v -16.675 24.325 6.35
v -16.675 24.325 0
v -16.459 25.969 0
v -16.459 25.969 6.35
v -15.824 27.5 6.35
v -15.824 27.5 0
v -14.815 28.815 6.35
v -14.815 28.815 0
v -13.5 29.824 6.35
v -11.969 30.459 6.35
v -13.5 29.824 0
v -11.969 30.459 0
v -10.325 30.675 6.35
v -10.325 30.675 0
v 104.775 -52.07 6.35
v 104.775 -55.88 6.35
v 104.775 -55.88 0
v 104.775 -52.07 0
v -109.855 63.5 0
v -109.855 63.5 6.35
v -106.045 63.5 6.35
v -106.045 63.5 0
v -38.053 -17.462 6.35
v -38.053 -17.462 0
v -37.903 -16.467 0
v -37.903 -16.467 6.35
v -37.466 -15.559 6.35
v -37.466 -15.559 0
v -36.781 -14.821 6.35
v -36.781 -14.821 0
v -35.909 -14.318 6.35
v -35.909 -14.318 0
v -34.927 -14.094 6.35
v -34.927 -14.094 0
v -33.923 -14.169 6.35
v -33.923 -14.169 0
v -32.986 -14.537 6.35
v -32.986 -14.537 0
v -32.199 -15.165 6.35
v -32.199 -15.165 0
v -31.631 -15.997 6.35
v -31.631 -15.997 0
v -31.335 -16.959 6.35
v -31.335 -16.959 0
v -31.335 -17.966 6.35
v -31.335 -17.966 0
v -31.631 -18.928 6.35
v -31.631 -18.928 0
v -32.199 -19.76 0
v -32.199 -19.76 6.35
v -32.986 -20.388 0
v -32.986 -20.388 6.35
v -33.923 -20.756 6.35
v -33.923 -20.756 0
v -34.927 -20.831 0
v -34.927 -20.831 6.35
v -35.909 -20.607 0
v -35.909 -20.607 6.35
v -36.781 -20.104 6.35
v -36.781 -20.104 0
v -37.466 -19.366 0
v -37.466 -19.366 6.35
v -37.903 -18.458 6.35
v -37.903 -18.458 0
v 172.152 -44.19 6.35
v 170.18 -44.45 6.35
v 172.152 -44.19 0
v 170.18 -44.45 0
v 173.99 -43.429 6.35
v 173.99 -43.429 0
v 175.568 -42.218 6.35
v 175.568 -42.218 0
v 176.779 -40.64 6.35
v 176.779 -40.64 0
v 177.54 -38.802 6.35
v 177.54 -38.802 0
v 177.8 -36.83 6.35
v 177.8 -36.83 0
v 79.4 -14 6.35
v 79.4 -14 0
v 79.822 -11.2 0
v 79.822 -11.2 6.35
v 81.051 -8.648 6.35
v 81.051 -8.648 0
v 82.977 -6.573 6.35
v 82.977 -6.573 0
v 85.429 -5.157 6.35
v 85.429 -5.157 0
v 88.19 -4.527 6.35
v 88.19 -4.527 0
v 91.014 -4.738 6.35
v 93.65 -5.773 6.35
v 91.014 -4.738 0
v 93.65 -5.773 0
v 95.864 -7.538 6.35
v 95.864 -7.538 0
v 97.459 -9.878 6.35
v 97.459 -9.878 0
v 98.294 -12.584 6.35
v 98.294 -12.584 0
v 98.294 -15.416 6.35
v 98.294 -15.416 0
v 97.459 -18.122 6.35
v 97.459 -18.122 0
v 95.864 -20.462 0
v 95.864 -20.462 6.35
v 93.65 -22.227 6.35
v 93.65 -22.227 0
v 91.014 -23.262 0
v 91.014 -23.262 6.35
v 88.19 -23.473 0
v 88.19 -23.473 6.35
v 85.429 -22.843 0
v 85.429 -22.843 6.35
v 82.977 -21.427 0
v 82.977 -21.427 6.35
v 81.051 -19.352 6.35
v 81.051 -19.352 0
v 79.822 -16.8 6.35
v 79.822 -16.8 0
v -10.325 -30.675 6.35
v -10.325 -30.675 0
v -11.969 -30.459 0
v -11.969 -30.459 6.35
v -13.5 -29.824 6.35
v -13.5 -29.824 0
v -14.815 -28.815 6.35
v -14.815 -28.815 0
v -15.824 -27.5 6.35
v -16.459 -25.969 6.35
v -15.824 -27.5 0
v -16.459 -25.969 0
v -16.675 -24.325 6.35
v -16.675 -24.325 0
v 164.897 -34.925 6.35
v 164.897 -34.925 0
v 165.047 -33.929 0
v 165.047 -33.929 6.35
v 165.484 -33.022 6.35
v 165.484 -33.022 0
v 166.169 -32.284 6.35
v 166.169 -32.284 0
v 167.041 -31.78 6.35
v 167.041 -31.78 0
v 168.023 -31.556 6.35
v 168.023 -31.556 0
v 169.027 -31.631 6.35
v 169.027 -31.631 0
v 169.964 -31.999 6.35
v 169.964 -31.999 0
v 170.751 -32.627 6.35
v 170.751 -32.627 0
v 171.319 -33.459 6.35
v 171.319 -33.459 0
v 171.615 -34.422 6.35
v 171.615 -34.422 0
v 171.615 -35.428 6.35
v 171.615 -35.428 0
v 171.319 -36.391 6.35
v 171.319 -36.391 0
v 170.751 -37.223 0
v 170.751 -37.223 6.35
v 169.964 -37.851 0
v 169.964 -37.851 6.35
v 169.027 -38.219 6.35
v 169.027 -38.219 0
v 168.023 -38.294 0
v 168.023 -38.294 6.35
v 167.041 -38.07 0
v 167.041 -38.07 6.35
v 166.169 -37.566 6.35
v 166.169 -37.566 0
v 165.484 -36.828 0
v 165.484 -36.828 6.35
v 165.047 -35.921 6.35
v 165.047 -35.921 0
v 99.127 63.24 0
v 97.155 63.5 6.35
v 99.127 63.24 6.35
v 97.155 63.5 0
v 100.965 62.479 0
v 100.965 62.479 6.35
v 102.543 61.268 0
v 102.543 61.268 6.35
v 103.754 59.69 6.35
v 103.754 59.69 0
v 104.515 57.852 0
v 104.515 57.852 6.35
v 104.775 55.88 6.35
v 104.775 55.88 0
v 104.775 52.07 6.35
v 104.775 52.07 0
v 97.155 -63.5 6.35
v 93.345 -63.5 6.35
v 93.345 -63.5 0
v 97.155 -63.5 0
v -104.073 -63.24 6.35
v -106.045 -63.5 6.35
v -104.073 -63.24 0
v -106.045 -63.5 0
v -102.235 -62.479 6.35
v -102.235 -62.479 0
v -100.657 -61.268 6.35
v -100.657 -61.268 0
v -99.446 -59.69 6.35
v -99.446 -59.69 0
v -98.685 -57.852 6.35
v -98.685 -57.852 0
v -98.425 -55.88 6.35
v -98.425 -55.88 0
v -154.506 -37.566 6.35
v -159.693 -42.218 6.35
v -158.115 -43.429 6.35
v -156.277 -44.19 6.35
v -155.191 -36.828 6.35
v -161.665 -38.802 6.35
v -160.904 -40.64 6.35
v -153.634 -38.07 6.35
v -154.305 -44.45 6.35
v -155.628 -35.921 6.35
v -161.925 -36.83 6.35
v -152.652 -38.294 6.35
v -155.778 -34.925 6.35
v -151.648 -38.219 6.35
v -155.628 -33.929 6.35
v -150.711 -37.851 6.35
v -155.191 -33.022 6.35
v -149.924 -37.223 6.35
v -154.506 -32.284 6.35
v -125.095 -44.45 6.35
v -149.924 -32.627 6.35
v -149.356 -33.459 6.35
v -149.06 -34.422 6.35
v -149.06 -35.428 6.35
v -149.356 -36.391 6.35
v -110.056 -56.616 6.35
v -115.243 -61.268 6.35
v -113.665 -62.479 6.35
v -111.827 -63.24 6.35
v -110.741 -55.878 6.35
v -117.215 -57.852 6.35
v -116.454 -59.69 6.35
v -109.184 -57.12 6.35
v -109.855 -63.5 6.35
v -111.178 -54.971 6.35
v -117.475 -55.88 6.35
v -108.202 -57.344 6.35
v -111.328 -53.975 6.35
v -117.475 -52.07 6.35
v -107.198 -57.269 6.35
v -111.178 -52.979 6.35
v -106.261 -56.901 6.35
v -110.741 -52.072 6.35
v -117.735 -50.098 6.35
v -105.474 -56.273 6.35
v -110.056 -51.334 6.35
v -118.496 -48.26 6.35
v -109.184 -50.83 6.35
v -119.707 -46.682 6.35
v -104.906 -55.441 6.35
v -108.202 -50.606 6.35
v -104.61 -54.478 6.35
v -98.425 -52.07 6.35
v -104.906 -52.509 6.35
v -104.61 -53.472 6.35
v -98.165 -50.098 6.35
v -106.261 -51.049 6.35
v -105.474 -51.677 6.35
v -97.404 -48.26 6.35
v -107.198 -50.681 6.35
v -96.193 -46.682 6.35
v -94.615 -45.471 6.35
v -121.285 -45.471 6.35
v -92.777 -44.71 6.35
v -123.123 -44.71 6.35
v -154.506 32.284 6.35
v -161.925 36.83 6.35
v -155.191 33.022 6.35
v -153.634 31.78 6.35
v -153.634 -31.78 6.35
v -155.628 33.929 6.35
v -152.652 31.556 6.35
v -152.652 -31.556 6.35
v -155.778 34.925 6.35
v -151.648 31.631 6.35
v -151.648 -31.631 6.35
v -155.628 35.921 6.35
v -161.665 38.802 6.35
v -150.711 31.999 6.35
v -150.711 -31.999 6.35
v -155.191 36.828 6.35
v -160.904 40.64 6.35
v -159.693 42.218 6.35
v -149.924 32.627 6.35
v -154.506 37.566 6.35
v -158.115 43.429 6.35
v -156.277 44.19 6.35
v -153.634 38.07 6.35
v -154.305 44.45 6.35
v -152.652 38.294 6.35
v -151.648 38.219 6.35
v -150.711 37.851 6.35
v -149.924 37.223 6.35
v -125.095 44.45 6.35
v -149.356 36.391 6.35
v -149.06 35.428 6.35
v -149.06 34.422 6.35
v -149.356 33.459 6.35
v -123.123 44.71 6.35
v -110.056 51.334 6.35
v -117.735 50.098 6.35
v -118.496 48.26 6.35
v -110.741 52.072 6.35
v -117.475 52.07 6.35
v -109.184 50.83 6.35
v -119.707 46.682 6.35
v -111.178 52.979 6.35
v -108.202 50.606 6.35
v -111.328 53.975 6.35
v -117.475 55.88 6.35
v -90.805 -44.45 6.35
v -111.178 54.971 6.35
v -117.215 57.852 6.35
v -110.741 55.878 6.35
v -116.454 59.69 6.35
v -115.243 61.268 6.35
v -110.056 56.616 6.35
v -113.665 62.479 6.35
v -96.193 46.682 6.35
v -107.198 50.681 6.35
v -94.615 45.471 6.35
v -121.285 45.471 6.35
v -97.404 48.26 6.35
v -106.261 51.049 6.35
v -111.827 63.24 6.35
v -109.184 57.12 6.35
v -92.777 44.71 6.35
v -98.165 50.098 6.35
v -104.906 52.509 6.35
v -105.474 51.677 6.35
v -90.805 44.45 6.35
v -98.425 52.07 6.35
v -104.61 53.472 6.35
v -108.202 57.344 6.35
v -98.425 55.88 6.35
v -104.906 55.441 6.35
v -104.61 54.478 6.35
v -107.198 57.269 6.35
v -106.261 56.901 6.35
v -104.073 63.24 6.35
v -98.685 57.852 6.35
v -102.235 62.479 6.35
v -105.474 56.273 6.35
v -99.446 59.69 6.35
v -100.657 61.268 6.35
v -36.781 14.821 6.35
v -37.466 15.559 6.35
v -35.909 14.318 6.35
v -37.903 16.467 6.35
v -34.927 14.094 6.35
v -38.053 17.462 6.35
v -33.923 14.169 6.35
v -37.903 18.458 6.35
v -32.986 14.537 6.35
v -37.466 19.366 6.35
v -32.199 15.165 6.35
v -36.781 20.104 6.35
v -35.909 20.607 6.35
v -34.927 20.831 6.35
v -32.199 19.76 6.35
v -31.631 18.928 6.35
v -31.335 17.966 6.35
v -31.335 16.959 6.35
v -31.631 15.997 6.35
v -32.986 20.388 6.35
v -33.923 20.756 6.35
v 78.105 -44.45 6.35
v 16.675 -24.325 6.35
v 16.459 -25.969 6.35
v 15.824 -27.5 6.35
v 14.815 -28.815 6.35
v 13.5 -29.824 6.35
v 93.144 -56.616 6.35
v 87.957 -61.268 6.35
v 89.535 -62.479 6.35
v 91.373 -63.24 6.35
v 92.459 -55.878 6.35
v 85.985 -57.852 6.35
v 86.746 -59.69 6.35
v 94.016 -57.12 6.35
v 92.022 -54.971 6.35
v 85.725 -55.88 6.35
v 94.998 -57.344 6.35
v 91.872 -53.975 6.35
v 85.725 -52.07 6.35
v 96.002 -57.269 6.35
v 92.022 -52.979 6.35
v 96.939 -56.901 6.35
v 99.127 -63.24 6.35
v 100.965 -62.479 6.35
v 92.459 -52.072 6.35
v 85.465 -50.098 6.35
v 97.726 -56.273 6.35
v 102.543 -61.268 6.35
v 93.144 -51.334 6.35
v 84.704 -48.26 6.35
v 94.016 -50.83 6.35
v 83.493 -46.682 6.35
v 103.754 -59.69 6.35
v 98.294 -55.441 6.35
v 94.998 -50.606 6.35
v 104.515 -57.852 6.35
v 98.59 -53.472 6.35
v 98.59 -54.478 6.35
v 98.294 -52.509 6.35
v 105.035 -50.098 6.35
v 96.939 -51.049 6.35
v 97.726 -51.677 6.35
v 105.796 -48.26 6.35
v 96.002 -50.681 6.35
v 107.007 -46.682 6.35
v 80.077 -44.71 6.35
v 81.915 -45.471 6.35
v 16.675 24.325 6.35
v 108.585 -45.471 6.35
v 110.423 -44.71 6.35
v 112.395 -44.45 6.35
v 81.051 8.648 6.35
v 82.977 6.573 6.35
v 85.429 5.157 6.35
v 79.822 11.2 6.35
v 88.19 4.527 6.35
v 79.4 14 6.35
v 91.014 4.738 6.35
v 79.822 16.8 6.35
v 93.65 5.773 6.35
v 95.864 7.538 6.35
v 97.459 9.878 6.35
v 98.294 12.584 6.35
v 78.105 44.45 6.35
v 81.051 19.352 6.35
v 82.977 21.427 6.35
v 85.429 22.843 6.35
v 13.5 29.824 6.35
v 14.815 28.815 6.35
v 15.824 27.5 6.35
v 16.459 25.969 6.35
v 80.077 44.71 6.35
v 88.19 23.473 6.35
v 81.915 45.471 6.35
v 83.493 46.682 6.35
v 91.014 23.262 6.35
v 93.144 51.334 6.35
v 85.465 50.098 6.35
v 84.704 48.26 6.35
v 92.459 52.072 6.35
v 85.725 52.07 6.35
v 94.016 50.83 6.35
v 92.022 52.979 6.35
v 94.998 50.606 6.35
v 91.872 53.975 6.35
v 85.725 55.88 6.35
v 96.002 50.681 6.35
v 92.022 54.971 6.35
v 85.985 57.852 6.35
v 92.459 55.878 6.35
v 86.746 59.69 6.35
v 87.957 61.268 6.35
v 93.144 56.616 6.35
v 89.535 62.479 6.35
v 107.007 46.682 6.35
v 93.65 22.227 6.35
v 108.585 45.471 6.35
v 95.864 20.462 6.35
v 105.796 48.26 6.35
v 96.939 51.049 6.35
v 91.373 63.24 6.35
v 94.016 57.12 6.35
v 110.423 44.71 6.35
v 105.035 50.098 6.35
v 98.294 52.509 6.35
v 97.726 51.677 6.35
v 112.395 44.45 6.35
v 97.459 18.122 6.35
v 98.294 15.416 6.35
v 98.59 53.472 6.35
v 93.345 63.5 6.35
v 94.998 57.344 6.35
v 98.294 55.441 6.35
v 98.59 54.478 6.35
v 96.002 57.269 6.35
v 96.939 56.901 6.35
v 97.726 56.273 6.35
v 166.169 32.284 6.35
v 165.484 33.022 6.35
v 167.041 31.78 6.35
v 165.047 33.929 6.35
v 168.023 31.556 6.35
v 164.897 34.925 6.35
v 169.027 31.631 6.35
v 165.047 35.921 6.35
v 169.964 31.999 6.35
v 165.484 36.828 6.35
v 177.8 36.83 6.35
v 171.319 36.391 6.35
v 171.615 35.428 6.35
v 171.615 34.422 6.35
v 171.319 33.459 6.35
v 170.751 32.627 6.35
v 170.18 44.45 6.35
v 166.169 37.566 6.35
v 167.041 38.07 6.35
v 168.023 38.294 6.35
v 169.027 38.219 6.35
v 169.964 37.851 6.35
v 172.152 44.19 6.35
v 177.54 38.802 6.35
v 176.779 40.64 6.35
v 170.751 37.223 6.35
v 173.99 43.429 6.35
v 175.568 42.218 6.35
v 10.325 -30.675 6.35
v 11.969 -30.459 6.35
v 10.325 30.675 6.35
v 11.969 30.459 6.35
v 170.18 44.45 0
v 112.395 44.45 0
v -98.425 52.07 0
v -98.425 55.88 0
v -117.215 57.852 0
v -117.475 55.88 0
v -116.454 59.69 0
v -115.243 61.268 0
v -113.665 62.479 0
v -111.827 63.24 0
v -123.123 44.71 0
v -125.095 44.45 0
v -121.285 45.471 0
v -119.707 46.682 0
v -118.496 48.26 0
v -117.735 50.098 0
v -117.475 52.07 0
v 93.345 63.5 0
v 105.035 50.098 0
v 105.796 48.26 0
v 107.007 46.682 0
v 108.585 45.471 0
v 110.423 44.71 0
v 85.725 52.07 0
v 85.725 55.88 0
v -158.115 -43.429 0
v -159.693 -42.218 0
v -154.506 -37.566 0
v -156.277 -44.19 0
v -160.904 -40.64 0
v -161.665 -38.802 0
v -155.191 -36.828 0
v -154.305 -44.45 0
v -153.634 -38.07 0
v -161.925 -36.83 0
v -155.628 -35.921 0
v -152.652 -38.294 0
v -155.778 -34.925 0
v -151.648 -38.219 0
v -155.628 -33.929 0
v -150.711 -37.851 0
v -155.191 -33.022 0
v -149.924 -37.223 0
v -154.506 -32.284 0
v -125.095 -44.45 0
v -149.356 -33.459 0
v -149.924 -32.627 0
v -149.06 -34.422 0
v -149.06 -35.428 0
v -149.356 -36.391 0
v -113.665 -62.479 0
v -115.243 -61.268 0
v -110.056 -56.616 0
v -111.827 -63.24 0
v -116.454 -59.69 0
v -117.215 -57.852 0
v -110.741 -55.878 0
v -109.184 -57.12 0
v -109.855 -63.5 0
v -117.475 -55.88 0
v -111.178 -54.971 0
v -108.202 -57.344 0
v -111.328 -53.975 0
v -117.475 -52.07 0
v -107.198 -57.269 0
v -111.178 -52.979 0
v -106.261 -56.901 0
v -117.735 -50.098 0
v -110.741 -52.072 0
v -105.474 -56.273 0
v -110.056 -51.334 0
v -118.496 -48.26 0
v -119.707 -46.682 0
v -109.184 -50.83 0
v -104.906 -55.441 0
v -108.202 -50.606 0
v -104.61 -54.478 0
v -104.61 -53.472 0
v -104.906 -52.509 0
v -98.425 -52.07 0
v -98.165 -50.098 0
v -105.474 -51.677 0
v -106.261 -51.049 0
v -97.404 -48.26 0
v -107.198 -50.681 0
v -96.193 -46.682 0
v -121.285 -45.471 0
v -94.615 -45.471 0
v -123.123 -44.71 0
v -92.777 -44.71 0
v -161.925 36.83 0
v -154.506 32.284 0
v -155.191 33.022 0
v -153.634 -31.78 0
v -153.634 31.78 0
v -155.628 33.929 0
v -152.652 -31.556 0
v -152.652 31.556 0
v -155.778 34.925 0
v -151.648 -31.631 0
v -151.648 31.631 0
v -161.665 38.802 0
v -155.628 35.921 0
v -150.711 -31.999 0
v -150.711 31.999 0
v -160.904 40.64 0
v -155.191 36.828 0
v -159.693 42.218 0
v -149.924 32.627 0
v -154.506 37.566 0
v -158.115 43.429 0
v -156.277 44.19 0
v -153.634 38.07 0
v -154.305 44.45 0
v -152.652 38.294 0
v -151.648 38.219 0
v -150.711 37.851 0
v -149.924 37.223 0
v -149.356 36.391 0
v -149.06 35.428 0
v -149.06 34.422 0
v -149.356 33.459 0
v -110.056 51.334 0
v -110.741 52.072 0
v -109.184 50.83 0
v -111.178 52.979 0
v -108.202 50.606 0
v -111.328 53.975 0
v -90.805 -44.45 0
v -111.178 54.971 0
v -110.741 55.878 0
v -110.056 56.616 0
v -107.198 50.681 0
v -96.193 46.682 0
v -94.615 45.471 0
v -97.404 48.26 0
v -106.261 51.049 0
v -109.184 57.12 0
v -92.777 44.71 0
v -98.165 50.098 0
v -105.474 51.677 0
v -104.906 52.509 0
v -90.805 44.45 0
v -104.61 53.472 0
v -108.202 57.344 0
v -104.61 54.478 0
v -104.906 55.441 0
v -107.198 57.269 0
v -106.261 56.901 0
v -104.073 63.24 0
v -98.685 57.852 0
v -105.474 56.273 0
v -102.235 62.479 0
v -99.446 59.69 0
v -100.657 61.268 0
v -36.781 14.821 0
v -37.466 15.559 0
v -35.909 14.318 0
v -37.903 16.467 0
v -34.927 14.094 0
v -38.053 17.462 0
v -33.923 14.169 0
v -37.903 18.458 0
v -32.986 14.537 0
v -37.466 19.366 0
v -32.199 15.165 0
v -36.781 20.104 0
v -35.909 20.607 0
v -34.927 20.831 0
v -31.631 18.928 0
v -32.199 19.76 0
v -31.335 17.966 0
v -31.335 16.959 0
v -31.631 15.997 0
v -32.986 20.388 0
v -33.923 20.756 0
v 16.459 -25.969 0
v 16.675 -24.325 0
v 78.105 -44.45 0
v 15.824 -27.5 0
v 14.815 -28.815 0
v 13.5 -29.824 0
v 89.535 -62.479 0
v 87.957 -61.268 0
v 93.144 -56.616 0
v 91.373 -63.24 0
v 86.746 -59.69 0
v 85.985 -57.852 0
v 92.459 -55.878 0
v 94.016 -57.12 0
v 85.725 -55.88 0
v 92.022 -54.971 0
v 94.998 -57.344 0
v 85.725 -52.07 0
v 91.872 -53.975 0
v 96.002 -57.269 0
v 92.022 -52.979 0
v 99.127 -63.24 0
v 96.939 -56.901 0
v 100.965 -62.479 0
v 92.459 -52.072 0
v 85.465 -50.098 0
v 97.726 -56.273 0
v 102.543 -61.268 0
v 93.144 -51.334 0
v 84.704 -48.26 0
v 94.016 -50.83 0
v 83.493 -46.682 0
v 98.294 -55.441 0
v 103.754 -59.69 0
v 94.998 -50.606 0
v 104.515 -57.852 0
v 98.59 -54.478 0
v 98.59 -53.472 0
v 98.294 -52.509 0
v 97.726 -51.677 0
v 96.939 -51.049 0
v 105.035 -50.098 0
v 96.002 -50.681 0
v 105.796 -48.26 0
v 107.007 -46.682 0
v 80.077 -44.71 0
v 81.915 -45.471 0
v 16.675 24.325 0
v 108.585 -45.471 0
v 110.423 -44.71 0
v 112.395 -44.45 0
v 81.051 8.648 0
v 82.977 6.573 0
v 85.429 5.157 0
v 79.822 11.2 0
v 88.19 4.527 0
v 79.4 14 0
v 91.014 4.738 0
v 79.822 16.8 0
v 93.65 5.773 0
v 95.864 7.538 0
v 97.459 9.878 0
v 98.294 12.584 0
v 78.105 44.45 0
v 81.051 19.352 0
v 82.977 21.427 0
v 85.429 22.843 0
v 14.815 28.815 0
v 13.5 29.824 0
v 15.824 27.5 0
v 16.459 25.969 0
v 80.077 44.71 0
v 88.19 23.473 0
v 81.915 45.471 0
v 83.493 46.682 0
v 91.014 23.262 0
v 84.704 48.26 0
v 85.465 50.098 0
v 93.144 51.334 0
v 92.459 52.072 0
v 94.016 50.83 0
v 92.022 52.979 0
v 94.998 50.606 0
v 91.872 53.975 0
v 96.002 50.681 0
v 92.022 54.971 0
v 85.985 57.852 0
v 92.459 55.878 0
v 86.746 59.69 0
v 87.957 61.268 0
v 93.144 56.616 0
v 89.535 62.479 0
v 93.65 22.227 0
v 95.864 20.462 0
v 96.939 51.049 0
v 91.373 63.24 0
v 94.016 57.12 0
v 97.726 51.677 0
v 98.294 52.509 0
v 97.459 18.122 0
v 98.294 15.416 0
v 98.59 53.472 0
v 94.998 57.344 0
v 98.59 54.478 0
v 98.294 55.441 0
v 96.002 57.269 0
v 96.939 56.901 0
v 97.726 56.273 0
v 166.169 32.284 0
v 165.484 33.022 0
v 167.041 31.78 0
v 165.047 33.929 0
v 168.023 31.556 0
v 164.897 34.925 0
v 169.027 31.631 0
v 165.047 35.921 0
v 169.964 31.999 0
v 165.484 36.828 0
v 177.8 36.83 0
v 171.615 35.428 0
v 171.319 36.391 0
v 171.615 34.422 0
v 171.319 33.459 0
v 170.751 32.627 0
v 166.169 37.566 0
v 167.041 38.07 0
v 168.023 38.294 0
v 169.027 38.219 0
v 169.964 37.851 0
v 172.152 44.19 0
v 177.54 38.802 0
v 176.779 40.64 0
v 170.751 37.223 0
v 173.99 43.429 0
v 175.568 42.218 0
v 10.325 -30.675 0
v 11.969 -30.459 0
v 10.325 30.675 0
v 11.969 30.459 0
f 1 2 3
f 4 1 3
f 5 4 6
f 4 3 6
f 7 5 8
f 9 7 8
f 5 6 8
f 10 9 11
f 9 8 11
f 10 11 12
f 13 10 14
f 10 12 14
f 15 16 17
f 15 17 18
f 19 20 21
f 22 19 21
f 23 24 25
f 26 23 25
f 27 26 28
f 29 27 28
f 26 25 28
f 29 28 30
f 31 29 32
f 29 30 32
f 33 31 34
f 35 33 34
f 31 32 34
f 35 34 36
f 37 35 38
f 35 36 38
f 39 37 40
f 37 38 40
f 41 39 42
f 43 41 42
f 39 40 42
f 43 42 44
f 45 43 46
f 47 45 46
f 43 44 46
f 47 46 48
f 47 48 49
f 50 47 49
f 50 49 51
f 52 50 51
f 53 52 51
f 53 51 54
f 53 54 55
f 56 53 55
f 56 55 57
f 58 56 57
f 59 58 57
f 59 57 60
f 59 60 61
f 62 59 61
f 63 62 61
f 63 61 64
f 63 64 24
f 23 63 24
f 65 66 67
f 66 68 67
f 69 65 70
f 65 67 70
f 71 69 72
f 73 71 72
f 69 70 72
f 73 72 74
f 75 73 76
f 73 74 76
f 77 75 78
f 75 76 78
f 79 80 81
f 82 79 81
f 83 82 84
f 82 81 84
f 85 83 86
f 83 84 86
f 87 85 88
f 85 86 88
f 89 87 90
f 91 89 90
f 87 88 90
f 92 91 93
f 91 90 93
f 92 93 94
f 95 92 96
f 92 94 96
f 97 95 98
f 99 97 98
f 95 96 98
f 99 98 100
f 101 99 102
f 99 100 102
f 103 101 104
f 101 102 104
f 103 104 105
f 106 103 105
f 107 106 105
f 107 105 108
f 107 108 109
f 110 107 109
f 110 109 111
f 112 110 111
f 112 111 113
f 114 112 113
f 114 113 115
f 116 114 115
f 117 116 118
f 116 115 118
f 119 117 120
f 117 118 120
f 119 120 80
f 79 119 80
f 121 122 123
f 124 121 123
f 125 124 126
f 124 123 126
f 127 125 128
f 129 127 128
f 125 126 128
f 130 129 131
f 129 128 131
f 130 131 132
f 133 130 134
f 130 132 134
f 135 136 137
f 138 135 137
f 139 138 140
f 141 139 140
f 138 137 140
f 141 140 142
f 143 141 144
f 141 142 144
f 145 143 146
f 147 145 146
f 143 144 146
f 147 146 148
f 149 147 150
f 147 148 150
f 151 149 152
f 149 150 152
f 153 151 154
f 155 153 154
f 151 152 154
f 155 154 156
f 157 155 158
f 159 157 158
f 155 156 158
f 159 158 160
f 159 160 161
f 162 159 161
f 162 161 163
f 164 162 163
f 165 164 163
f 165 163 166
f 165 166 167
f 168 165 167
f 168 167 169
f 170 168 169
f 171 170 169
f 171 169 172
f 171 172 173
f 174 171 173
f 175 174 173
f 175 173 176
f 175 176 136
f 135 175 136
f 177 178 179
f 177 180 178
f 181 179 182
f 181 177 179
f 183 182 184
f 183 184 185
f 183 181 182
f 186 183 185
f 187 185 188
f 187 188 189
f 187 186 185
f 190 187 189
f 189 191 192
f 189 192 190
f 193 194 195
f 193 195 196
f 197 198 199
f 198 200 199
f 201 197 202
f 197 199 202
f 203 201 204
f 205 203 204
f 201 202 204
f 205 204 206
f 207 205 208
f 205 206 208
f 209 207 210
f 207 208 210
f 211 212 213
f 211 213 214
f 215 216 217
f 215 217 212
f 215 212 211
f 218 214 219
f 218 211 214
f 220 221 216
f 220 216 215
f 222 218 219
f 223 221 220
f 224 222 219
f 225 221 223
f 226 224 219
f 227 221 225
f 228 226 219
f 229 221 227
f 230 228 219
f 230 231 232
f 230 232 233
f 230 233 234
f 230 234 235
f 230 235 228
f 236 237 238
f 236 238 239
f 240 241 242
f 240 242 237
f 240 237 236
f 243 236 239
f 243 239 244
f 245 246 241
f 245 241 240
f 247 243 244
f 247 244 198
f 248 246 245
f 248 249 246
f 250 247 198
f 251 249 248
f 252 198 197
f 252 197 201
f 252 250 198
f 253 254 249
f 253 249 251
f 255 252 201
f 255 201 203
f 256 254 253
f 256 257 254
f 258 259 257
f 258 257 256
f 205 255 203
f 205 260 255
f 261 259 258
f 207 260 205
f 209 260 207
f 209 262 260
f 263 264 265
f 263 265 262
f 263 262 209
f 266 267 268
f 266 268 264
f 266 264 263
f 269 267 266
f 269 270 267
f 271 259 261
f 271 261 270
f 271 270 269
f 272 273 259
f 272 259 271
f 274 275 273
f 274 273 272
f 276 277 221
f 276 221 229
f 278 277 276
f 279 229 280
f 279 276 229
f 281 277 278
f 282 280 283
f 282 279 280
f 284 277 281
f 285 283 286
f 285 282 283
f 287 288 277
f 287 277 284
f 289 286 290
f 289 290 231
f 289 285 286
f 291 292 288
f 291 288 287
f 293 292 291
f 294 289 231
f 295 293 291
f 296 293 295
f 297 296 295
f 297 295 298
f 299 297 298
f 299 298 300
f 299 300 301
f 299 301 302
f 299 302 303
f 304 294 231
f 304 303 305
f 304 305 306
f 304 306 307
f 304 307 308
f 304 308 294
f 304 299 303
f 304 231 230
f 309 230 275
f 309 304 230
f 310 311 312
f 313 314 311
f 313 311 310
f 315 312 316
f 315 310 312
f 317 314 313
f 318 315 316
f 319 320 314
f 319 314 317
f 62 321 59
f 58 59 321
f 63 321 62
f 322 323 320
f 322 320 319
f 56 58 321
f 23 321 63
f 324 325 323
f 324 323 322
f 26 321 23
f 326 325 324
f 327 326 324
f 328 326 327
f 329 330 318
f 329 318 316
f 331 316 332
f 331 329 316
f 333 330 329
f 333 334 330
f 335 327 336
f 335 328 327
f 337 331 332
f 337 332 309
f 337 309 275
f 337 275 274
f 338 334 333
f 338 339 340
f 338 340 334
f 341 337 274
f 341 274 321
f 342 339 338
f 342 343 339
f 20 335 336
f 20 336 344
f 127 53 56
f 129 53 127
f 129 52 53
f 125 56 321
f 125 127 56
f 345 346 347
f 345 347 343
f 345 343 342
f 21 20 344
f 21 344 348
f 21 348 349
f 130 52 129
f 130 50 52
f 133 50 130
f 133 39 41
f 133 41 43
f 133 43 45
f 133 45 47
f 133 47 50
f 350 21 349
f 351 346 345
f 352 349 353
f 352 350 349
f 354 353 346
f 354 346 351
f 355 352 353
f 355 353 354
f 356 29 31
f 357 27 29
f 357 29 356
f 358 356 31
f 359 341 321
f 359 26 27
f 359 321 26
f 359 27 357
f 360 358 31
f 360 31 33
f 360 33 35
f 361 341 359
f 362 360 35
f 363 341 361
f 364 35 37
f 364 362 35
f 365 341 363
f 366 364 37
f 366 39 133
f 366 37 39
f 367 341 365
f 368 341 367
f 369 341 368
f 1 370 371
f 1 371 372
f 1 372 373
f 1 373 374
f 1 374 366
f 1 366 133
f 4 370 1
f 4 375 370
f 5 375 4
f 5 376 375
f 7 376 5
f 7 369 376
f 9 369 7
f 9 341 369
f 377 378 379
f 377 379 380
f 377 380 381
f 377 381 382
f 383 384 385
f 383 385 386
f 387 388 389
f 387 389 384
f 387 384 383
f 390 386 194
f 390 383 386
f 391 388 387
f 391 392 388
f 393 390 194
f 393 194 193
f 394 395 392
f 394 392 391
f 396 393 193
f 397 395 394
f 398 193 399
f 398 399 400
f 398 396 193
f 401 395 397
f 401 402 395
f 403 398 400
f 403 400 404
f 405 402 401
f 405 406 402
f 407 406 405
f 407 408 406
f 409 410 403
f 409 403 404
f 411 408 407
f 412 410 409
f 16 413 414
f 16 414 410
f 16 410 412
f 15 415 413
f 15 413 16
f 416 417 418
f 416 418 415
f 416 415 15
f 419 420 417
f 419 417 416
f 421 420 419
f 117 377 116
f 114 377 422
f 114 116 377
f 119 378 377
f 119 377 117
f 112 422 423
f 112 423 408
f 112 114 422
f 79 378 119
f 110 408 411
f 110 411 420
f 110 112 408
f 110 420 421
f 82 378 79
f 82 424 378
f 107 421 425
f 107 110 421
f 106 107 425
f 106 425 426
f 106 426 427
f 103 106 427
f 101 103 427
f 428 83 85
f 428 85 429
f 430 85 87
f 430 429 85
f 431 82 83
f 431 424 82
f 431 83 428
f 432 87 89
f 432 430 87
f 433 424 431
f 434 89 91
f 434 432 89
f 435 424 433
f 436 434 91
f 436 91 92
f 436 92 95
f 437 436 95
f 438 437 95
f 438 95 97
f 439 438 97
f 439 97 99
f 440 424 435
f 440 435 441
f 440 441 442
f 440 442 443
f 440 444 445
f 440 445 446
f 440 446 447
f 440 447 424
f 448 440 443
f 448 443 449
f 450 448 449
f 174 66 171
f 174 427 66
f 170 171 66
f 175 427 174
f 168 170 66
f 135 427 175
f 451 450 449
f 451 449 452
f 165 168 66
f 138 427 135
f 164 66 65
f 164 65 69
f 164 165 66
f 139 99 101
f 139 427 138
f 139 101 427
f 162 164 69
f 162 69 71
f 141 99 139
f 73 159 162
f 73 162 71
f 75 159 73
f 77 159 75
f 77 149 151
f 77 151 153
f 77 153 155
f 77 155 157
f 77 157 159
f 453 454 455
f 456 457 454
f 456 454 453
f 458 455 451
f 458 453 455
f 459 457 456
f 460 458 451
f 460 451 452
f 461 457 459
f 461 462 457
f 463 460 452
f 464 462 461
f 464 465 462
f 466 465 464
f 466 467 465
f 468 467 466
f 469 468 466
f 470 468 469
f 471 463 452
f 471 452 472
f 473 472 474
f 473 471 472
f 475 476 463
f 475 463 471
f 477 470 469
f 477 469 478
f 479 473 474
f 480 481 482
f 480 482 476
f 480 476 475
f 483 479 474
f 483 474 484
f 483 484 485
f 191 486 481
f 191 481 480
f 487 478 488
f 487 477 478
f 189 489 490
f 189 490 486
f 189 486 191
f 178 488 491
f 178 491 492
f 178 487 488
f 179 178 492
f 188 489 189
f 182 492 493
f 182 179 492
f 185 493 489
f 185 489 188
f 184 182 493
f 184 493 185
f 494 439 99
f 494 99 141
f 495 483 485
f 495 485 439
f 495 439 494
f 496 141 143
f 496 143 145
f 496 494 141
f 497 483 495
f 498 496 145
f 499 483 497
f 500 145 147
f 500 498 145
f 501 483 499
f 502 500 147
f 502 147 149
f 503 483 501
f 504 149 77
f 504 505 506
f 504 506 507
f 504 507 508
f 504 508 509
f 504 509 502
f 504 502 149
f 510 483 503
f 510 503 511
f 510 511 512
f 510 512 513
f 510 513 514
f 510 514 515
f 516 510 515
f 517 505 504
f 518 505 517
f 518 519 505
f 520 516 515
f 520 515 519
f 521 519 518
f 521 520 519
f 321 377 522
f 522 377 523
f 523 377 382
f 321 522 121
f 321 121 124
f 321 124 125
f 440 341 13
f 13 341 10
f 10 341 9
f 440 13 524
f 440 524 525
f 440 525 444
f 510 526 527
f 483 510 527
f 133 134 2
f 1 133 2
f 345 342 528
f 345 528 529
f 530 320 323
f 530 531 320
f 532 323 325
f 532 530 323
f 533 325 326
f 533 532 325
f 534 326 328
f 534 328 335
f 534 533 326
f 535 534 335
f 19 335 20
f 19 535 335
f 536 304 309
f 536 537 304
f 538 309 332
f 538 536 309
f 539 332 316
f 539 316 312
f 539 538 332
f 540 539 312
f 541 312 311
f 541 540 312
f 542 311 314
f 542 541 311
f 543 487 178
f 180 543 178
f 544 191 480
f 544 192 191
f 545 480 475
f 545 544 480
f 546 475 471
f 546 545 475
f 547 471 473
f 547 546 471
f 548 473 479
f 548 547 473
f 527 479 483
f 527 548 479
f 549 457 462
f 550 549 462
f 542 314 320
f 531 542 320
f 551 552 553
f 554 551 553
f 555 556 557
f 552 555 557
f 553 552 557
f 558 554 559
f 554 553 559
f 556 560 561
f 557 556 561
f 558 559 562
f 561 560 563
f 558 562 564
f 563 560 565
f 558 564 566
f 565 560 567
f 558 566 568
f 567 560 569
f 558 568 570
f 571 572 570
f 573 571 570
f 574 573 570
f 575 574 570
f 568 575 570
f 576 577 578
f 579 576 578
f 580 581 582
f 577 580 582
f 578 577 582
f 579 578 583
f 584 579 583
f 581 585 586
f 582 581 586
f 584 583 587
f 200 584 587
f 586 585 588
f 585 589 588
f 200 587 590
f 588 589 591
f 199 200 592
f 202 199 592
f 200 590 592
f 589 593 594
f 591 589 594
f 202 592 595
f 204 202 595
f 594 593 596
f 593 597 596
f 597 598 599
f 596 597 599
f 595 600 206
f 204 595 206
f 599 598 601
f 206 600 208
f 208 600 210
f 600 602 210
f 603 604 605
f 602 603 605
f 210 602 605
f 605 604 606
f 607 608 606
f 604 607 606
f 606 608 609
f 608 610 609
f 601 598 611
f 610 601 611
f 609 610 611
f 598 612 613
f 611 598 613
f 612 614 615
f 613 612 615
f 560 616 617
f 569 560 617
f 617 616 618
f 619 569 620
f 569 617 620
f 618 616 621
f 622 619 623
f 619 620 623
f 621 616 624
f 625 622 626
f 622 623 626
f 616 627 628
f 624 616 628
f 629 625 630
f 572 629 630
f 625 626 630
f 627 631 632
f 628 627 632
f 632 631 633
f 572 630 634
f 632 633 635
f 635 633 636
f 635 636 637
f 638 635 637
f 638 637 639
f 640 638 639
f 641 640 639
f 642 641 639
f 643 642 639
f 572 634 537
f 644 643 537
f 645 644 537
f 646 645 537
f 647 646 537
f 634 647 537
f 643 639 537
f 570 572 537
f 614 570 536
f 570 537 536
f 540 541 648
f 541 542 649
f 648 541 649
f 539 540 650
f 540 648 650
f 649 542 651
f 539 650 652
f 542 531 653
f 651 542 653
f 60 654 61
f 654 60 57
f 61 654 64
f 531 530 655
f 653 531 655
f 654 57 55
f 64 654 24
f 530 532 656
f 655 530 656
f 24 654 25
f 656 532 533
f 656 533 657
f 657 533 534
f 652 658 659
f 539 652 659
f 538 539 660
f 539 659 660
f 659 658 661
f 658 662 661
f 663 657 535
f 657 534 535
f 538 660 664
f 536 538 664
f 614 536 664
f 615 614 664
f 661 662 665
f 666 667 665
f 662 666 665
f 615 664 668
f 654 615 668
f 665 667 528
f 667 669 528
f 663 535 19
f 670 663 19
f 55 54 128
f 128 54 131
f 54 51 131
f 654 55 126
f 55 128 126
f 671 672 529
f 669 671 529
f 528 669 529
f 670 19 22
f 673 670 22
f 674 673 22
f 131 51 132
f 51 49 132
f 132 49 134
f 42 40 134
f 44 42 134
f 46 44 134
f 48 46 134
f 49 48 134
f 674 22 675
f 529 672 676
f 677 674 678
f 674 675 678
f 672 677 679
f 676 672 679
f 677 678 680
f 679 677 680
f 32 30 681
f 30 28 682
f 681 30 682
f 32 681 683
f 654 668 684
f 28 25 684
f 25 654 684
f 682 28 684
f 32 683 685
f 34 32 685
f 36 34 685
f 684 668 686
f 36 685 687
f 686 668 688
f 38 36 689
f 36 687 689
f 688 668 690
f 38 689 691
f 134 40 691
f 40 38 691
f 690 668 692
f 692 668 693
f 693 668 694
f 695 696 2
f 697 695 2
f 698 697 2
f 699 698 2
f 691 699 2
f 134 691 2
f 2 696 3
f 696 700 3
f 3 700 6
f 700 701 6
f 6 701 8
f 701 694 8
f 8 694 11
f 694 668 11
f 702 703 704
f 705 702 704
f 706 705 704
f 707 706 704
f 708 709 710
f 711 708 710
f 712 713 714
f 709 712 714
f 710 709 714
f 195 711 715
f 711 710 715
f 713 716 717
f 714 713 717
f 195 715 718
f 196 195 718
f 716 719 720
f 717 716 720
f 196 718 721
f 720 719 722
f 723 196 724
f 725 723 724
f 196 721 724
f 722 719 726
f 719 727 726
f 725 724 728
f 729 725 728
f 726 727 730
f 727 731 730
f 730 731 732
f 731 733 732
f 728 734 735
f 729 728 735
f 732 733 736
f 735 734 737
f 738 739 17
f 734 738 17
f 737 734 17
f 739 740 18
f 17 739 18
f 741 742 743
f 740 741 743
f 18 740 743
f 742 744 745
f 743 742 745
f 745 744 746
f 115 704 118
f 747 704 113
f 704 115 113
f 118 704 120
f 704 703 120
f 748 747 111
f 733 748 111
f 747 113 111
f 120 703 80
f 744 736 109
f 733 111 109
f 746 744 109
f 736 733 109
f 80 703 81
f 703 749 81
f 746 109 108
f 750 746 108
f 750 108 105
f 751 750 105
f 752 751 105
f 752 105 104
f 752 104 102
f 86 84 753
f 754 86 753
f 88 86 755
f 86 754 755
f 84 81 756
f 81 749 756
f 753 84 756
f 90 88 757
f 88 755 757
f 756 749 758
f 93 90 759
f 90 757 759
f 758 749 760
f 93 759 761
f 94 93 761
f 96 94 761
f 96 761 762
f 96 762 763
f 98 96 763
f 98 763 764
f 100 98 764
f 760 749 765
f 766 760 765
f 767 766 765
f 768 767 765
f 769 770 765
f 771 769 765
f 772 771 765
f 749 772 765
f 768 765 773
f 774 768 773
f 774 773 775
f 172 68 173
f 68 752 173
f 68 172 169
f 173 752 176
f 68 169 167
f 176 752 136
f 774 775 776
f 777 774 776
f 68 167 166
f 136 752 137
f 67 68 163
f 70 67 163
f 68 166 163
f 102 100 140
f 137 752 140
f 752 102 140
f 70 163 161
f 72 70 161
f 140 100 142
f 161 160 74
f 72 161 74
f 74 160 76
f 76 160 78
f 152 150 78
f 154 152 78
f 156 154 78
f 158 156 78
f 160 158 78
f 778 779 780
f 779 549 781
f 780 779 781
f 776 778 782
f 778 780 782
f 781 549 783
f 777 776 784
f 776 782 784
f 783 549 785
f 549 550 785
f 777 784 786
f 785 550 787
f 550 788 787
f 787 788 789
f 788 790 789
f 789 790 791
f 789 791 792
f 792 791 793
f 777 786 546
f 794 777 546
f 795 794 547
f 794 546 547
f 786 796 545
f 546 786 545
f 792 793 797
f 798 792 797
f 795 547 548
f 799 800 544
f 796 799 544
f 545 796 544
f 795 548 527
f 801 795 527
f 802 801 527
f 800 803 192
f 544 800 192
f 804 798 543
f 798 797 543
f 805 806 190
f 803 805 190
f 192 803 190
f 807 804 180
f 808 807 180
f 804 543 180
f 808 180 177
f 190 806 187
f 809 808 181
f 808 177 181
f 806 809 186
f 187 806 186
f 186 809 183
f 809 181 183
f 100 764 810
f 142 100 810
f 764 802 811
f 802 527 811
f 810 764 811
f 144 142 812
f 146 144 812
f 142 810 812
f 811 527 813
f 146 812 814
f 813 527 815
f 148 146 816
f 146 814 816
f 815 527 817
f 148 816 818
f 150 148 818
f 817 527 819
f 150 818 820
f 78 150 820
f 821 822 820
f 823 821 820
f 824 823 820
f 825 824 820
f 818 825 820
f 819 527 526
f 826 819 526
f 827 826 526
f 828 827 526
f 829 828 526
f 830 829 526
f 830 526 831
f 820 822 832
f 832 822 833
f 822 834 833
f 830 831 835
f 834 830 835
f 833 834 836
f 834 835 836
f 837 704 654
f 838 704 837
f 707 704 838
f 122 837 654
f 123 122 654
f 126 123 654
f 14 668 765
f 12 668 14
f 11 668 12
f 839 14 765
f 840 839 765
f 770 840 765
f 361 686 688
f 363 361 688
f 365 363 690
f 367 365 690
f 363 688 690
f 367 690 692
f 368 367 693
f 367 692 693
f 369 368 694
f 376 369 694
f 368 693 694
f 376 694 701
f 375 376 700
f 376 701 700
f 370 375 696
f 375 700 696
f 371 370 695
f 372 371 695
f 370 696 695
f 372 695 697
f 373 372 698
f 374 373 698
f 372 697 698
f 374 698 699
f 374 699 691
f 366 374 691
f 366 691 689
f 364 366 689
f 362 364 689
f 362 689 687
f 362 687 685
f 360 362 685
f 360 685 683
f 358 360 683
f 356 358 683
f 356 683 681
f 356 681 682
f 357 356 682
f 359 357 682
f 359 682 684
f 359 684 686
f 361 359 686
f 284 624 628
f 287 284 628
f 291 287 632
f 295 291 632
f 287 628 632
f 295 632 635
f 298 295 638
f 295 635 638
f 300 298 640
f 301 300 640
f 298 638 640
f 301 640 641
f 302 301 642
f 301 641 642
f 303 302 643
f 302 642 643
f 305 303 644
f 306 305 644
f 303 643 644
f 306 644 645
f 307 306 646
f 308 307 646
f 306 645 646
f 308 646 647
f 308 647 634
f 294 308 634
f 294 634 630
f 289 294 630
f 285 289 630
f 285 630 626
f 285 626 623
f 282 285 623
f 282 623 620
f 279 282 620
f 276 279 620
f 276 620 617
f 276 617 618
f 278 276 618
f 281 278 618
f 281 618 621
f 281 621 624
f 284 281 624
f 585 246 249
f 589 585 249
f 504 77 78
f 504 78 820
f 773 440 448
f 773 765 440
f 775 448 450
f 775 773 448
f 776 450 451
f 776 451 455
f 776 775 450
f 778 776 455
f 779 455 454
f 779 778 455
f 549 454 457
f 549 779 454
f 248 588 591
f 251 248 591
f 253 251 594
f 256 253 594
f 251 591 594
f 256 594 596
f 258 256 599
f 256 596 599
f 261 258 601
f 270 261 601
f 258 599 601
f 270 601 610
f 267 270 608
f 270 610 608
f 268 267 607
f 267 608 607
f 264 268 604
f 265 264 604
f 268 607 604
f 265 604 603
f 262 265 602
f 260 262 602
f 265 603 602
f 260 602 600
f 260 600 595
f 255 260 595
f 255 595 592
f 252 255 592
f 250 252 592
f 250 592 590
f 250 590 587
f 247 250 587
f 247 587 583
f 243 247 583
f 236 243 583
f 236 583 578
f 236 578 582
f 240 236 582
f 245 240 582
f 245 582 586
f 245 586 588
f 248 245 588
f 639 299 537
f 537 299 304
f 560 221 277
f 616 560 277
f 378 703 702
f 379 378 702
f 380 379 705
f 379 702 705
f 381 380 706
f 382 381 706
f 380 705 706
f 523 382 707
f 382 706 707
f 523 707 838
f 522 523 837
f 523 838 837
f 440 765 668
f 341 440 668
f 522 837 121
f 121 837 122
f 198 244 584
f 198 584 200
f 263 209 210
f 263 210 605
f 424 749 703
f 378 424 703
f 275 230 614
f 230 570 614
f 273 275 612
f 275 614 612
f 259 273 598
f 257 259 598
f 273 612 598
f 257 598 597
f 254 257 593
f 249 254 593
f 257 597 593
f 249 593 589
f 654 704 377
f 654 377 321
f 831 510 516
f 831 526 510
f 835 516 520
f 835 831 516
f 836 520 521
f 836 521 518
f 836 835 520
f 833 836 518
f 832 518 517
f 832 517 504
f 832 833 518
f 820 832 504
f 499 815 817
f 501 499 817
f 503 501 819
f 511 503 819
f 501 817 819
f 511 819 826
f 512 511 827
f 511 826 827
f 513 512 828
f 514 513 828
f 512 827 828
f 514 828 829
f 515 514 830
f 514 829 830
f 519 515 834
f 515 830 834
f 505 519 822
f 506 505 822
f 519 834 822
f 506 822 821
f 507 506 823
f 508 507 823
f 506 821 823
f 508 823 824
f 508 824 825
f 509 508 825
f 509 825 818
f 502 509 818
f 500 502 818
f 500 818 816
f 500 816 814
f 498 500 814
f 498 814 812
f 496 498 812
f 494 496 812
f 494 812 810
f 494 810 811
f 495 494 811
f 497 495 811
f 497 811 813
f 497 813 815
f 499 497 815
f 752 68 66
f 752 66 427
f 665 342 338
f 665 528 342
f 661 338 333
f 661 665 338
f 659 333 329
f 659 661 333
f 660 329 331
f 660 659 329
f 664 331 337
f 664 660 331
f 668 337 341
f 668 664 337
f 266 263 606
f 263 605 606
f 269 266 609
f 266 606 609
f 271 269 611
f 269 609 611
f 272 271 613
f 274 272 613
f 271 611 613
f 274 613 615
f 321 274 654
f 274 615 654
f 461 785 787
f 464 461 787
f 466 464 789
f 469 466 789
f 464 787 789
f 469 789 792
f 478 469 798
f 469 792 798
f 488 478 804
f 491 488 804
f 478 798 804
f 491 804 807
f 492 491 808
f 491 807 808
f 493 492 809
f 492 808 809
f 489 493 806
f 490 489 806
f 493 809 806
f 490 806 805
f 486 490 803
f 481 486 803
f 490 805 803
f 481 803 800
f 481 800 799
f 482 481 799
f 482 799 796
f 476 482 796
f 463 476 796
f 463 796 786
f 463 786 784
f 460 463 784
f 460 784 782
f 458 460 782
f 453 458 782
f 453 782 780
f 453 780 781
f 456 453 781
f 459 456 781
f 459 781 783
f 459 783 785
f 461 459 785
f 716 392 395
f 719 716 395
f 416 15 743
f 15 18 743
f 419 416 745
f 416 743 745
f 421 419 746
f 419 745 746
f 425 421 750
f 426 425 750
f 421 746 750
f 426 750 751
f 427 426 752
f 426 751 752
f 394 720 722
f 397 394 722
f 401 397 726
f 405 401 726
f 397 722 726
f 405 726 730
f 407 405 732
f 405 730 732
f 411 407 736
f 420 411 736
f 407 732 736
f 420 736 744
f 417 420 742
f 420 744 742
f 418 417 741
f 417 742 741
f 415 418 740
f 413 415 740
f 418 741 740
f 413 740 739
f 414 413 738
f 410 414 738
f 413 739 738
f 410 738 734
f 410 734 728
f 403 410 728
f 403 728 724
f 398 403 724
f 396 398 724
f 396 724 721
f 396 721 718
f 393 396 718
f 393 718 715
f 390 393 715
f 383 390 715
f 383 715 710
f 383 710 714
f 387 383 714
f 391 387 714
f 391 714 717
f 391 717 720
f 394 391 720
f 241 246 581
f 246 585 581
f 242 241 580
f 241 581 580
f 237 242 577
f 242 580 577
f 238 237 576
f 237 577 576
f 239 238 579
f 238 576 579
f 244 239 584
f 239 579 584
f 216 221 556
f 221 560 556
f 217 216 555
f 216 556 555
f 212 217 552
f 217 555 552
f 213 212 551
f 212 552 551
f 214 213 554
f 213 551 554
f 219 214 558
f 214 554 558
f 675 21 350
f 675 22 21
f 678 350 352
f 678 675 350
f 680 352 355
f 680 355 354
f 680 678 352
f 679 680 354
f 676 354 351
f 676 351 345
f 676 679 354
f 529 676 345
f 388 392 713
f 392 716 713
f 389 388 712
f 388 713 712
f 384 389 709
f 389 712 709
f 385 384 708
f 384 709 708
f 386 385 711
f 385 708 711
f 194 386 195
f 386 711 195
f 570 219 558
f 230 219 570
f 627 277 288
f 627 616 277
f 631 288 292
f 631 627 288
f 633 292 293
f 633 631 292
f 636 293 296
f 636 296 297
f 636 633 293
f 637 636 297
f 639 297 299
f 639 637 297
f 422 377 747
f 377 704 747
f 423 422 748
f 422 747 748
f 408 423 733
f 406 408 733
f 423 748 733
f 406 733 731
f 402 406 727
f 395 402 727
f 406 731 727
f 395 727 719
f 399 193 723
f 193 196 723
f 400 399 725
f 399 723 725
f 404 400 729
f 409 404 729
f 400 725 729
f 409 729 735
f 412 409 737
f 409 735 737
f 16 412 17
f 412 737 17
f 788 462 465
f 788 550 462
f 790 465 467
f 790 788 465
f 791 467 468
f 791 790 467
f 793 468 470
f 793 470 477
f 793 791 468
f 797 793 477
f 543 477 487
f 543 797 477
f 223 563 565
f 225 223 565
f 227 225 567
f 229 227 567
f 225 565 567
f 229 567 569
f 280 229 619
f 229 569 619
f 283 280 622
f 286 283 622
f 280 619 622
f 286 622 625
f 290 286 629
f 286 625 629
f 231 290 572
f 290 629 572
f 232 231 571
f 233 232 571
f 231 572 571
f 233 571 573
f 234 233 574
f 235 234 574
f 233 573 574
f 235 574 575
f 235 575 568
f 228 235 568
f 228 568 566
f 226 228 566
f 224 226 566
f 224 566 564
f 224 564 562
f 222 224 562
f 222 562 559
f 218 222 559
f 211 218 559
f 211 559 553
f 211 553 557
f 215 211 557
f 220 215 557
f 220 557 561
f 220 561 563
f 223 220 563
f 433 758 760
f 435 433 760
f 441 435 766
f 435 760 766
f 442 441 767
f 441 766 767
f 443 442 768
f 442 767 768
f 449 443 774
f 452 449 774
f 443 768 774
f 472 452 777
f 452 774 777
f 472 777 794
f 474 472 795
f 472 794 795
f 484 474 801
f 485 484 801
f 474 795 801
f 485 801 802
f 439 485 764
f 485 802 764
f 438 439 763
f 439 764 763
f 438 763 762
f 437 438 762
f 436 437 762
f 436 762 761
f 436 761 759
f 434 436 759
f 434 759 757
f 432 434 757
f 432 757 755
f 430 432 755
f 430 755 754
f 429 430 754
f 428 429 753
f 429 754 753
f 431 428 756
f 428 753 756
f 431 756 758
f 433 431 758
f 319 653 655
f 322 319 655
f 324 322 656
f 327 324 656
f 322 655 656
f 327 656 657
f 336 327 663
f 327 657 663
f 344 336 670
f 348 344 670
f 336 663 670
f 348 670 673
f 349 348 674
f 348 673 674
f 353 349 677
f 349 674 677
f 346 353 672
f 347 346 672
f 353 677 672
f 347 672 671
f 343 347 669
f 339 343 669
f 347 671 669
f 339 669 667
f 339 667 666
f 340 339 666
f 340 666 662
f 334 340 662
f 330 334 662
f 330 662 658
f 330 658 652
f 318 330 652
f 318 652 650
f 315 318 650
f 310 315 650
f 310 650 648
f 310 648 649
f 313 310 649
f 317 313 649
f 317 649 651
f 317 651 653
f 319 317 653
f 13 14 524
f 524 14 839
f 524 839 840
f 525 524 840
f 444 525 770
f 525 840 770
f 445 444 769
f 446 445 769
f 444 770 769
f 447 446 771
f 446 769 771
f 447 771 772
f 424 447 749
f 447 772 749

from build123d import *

# Parameters (mm, degrees)
SKETCH1_W               = 254
SKETCH1_H               = 88.9
SKETCH1_R               = 9.5
SKETCH1_W_2             = 27
SKETCH1_H_2             = 55
BOSS_EXTRUDE1_DEPTH     = 6.35
SKETCH4_W               = 19.05
SKETCH4_H               = 19.05
BOSS_EXTRUDE2_DEPTH     = 6.35
SKETCH7_W               = 34.925
SKETCH7_H               = 88.9
SKETCH7_W_2             = 50.8
BOSS_EXTRUDE3_DEPTH     = 6.35
F_1_4_CLEARANCE_HOLE1_D = 6.7564
FILLET1_R               = 3.175
FILLET2_R               = 7.62
CUT_EXTRUDE1_DEPTH      = 7.35


with BuildPart() as part:
    # Sketch1 → Boss-Extrude1 (new body)
    with BuildSketch(Plane(origin=(0, 0, 0), x_dir=(-1, 0, 0), z_dir=(0, 0, -1))):
        Rectangle(SKETCH1_W, SKETCH1_H)
        with Locations((-88.9000016, 14)):
            Circle(SKETCH1_R, mode=Mode.SUBTRACT)
        with Locations((-88.9000016, -14)):
            Circle(SKETCH1_R, mode=Mode.SUBTRACT)
        Rectangle(SKETCH1_W_2, SKETCH1_H_2, mode=Mode.SUBTRACT)
    extrude(amount=-BOSS_EXTRUDE1_DEPTH)

    # Sketch4 → Boss-Extrude2 (add)
    with BuildSketch(Plane.XY.offset(6.35)):
        with Locations((-107.95, 53.975)):
            Rectangle(SKETCH4_W, SKETCH4_H)
        with Locations((-107.95, -53.975)):
            Rectangle(SKETCH4_W, SKETCH4_H)
        with Locations((95.25, -53.975)):
            Rectangle(SKETCH4_W, SKETCH4_H)
        with Locations((95.25, 53.975)):
            Rectangle(SKETCH4_W, SKETCH4_H)
    extrude(amount=-BOSS_EXTRUDE2_DEPTH)

    # Sketch7 → Boss-Extrude3 (add)
    with BuildSketch(Plane.XY.offset(6.35)):
        with Locations((-144.4625, 0)):
            Rectangle(SKETCH7_W, SKETCH7_H)
        with Locations((152.4, 0)):
            Rectangle(SKETCH7_W_2, SKETCH7_H)
    extrude(amount=-BOSS_EXTRUDE3_DEPTH)

    # 1/4 Clearance Hole1 (through all)
    with Locations(Plane.XY.offset(6.35)):
        with Locations((-107.95, 53.975), (95.25, 53.975), (95.25, -53.975), (-107.95, -53.975), (168.275, -34.925), (168.275, 34.925), (-152.4, 34.925), (-152.4, -34.925), (-34.675, 17.4625), (-34.675, -17.4625)):
            Hole(F_1_4_CLEARANCE_HOLE1_D / 2)

    # Fillet1
    fillet1_edges = [part.edges().sort_by_distance(p)[0] for p in [
        (13.5, 27.5, 3.175),
        (-13.5, 27.5, 3.175),
        (-13.5, -27.5, 3.175),
        (13.5, -27.5, 3.175),
    ]]
    fillet(fillet1_edges, radius=FILLET1_R)

    # Fillet2
    fillet2_edges = [part.edges().sort_by_distance(p)[0] for p in [
        (-98.425, 44.45, 3.175),
        (-98.425, 63.5, 3.175),
        (-117.475, 63.5, 3.175),
        (-117.475, 44.45, 3.175),
        (-98.425, -63.5, 3.175),
        (-98.425, -44.45, 3.175),
        (-117.475, -44.45, 3.175),
        (-117.475, -63.5, 3.175),
        (85.725, -63.5, 3.175),
        (104.775, -63.5, 3.175),
        (104.775, -44.45, 3.175),
        (85.725, -44.45, 3.175),
        (85.725, 63.5, 3.175),
        (85.725, 44.45, 3.175),
        (104.775, 44.45, 3.175),
        (104.775, 63.5, 3.175),
        (-161.925, 44.45, 3.175),
        (-161.925, -44.45, 3.175),
        (177.8, -44.45, 3.175),
        (177.8, 44.45, 3.175),
    ]]
    fillet(fillet2_edges, radius=FILLET2_R)

    # Sketch8 → Cut-Extrude1 (cut, through all)
    with BuildSketch(Plane(origin=(0, 0, 0), x_dir=(-1, 0, 0), z_dir=(0, 0, -1))):
        with BuildLine():
            Line((10.325, 30.675), (-10.325, 30.675))
            ThreePointArc((-10.325, 30.675), (-14.815128061, 28.815128061), (-16.675, 24.325))
            Line((-16.675, 24.325), (-16.675, -24.325))
            ThreePointArc((-16.675, -24.325), (-14.815128061, -28.815128061), (-10.325, -30.675))
            Line((-10.325, -30.675), (10.325, -30.675))
            ThreePointArc((10.325, -30.675), (14.815128061, -28.815128061), (16.675, -24.325))
            Line((16.675, -24.325), (16.675, 24.325))
            ThreePointArc((16.675, 24.325), (14.815128061, 28.815128061), (10.325, 30.675))
        make_face()
        with BuildLine():
            Line((10.325, 27.5), (-10.325, 27.5))
            ThreePointArc((-10.325, 27.5), (-12.57006403, 26.57006403), (-13.5, 24.325))
            Line((-13.5, 24.325), (-13.5, -24.325))
            ThreePointArc((-13.5, -24.325), (-12.57006403, -26.57006403), (-10.325, -27.5))
            Line((-10.325, -27.5), (10.325, -27.5))
            ThreePointArc((10.325, -27.5), (12.57006403, -26.57006403), (13.5, -24.325))
            Line((13.5, -24.325), (13.5, 24.325))
            ThreePointArc((13.5, 24.325), (12.57006403, 26.57006403), (10.325, 27.5))
        make_face(mode=Mode.SUBTRACT)
    extrude(amount=-CUT_EXTRUDE1_DEPTH, mode=Mode.SUBTRACT)


solid = part.part
